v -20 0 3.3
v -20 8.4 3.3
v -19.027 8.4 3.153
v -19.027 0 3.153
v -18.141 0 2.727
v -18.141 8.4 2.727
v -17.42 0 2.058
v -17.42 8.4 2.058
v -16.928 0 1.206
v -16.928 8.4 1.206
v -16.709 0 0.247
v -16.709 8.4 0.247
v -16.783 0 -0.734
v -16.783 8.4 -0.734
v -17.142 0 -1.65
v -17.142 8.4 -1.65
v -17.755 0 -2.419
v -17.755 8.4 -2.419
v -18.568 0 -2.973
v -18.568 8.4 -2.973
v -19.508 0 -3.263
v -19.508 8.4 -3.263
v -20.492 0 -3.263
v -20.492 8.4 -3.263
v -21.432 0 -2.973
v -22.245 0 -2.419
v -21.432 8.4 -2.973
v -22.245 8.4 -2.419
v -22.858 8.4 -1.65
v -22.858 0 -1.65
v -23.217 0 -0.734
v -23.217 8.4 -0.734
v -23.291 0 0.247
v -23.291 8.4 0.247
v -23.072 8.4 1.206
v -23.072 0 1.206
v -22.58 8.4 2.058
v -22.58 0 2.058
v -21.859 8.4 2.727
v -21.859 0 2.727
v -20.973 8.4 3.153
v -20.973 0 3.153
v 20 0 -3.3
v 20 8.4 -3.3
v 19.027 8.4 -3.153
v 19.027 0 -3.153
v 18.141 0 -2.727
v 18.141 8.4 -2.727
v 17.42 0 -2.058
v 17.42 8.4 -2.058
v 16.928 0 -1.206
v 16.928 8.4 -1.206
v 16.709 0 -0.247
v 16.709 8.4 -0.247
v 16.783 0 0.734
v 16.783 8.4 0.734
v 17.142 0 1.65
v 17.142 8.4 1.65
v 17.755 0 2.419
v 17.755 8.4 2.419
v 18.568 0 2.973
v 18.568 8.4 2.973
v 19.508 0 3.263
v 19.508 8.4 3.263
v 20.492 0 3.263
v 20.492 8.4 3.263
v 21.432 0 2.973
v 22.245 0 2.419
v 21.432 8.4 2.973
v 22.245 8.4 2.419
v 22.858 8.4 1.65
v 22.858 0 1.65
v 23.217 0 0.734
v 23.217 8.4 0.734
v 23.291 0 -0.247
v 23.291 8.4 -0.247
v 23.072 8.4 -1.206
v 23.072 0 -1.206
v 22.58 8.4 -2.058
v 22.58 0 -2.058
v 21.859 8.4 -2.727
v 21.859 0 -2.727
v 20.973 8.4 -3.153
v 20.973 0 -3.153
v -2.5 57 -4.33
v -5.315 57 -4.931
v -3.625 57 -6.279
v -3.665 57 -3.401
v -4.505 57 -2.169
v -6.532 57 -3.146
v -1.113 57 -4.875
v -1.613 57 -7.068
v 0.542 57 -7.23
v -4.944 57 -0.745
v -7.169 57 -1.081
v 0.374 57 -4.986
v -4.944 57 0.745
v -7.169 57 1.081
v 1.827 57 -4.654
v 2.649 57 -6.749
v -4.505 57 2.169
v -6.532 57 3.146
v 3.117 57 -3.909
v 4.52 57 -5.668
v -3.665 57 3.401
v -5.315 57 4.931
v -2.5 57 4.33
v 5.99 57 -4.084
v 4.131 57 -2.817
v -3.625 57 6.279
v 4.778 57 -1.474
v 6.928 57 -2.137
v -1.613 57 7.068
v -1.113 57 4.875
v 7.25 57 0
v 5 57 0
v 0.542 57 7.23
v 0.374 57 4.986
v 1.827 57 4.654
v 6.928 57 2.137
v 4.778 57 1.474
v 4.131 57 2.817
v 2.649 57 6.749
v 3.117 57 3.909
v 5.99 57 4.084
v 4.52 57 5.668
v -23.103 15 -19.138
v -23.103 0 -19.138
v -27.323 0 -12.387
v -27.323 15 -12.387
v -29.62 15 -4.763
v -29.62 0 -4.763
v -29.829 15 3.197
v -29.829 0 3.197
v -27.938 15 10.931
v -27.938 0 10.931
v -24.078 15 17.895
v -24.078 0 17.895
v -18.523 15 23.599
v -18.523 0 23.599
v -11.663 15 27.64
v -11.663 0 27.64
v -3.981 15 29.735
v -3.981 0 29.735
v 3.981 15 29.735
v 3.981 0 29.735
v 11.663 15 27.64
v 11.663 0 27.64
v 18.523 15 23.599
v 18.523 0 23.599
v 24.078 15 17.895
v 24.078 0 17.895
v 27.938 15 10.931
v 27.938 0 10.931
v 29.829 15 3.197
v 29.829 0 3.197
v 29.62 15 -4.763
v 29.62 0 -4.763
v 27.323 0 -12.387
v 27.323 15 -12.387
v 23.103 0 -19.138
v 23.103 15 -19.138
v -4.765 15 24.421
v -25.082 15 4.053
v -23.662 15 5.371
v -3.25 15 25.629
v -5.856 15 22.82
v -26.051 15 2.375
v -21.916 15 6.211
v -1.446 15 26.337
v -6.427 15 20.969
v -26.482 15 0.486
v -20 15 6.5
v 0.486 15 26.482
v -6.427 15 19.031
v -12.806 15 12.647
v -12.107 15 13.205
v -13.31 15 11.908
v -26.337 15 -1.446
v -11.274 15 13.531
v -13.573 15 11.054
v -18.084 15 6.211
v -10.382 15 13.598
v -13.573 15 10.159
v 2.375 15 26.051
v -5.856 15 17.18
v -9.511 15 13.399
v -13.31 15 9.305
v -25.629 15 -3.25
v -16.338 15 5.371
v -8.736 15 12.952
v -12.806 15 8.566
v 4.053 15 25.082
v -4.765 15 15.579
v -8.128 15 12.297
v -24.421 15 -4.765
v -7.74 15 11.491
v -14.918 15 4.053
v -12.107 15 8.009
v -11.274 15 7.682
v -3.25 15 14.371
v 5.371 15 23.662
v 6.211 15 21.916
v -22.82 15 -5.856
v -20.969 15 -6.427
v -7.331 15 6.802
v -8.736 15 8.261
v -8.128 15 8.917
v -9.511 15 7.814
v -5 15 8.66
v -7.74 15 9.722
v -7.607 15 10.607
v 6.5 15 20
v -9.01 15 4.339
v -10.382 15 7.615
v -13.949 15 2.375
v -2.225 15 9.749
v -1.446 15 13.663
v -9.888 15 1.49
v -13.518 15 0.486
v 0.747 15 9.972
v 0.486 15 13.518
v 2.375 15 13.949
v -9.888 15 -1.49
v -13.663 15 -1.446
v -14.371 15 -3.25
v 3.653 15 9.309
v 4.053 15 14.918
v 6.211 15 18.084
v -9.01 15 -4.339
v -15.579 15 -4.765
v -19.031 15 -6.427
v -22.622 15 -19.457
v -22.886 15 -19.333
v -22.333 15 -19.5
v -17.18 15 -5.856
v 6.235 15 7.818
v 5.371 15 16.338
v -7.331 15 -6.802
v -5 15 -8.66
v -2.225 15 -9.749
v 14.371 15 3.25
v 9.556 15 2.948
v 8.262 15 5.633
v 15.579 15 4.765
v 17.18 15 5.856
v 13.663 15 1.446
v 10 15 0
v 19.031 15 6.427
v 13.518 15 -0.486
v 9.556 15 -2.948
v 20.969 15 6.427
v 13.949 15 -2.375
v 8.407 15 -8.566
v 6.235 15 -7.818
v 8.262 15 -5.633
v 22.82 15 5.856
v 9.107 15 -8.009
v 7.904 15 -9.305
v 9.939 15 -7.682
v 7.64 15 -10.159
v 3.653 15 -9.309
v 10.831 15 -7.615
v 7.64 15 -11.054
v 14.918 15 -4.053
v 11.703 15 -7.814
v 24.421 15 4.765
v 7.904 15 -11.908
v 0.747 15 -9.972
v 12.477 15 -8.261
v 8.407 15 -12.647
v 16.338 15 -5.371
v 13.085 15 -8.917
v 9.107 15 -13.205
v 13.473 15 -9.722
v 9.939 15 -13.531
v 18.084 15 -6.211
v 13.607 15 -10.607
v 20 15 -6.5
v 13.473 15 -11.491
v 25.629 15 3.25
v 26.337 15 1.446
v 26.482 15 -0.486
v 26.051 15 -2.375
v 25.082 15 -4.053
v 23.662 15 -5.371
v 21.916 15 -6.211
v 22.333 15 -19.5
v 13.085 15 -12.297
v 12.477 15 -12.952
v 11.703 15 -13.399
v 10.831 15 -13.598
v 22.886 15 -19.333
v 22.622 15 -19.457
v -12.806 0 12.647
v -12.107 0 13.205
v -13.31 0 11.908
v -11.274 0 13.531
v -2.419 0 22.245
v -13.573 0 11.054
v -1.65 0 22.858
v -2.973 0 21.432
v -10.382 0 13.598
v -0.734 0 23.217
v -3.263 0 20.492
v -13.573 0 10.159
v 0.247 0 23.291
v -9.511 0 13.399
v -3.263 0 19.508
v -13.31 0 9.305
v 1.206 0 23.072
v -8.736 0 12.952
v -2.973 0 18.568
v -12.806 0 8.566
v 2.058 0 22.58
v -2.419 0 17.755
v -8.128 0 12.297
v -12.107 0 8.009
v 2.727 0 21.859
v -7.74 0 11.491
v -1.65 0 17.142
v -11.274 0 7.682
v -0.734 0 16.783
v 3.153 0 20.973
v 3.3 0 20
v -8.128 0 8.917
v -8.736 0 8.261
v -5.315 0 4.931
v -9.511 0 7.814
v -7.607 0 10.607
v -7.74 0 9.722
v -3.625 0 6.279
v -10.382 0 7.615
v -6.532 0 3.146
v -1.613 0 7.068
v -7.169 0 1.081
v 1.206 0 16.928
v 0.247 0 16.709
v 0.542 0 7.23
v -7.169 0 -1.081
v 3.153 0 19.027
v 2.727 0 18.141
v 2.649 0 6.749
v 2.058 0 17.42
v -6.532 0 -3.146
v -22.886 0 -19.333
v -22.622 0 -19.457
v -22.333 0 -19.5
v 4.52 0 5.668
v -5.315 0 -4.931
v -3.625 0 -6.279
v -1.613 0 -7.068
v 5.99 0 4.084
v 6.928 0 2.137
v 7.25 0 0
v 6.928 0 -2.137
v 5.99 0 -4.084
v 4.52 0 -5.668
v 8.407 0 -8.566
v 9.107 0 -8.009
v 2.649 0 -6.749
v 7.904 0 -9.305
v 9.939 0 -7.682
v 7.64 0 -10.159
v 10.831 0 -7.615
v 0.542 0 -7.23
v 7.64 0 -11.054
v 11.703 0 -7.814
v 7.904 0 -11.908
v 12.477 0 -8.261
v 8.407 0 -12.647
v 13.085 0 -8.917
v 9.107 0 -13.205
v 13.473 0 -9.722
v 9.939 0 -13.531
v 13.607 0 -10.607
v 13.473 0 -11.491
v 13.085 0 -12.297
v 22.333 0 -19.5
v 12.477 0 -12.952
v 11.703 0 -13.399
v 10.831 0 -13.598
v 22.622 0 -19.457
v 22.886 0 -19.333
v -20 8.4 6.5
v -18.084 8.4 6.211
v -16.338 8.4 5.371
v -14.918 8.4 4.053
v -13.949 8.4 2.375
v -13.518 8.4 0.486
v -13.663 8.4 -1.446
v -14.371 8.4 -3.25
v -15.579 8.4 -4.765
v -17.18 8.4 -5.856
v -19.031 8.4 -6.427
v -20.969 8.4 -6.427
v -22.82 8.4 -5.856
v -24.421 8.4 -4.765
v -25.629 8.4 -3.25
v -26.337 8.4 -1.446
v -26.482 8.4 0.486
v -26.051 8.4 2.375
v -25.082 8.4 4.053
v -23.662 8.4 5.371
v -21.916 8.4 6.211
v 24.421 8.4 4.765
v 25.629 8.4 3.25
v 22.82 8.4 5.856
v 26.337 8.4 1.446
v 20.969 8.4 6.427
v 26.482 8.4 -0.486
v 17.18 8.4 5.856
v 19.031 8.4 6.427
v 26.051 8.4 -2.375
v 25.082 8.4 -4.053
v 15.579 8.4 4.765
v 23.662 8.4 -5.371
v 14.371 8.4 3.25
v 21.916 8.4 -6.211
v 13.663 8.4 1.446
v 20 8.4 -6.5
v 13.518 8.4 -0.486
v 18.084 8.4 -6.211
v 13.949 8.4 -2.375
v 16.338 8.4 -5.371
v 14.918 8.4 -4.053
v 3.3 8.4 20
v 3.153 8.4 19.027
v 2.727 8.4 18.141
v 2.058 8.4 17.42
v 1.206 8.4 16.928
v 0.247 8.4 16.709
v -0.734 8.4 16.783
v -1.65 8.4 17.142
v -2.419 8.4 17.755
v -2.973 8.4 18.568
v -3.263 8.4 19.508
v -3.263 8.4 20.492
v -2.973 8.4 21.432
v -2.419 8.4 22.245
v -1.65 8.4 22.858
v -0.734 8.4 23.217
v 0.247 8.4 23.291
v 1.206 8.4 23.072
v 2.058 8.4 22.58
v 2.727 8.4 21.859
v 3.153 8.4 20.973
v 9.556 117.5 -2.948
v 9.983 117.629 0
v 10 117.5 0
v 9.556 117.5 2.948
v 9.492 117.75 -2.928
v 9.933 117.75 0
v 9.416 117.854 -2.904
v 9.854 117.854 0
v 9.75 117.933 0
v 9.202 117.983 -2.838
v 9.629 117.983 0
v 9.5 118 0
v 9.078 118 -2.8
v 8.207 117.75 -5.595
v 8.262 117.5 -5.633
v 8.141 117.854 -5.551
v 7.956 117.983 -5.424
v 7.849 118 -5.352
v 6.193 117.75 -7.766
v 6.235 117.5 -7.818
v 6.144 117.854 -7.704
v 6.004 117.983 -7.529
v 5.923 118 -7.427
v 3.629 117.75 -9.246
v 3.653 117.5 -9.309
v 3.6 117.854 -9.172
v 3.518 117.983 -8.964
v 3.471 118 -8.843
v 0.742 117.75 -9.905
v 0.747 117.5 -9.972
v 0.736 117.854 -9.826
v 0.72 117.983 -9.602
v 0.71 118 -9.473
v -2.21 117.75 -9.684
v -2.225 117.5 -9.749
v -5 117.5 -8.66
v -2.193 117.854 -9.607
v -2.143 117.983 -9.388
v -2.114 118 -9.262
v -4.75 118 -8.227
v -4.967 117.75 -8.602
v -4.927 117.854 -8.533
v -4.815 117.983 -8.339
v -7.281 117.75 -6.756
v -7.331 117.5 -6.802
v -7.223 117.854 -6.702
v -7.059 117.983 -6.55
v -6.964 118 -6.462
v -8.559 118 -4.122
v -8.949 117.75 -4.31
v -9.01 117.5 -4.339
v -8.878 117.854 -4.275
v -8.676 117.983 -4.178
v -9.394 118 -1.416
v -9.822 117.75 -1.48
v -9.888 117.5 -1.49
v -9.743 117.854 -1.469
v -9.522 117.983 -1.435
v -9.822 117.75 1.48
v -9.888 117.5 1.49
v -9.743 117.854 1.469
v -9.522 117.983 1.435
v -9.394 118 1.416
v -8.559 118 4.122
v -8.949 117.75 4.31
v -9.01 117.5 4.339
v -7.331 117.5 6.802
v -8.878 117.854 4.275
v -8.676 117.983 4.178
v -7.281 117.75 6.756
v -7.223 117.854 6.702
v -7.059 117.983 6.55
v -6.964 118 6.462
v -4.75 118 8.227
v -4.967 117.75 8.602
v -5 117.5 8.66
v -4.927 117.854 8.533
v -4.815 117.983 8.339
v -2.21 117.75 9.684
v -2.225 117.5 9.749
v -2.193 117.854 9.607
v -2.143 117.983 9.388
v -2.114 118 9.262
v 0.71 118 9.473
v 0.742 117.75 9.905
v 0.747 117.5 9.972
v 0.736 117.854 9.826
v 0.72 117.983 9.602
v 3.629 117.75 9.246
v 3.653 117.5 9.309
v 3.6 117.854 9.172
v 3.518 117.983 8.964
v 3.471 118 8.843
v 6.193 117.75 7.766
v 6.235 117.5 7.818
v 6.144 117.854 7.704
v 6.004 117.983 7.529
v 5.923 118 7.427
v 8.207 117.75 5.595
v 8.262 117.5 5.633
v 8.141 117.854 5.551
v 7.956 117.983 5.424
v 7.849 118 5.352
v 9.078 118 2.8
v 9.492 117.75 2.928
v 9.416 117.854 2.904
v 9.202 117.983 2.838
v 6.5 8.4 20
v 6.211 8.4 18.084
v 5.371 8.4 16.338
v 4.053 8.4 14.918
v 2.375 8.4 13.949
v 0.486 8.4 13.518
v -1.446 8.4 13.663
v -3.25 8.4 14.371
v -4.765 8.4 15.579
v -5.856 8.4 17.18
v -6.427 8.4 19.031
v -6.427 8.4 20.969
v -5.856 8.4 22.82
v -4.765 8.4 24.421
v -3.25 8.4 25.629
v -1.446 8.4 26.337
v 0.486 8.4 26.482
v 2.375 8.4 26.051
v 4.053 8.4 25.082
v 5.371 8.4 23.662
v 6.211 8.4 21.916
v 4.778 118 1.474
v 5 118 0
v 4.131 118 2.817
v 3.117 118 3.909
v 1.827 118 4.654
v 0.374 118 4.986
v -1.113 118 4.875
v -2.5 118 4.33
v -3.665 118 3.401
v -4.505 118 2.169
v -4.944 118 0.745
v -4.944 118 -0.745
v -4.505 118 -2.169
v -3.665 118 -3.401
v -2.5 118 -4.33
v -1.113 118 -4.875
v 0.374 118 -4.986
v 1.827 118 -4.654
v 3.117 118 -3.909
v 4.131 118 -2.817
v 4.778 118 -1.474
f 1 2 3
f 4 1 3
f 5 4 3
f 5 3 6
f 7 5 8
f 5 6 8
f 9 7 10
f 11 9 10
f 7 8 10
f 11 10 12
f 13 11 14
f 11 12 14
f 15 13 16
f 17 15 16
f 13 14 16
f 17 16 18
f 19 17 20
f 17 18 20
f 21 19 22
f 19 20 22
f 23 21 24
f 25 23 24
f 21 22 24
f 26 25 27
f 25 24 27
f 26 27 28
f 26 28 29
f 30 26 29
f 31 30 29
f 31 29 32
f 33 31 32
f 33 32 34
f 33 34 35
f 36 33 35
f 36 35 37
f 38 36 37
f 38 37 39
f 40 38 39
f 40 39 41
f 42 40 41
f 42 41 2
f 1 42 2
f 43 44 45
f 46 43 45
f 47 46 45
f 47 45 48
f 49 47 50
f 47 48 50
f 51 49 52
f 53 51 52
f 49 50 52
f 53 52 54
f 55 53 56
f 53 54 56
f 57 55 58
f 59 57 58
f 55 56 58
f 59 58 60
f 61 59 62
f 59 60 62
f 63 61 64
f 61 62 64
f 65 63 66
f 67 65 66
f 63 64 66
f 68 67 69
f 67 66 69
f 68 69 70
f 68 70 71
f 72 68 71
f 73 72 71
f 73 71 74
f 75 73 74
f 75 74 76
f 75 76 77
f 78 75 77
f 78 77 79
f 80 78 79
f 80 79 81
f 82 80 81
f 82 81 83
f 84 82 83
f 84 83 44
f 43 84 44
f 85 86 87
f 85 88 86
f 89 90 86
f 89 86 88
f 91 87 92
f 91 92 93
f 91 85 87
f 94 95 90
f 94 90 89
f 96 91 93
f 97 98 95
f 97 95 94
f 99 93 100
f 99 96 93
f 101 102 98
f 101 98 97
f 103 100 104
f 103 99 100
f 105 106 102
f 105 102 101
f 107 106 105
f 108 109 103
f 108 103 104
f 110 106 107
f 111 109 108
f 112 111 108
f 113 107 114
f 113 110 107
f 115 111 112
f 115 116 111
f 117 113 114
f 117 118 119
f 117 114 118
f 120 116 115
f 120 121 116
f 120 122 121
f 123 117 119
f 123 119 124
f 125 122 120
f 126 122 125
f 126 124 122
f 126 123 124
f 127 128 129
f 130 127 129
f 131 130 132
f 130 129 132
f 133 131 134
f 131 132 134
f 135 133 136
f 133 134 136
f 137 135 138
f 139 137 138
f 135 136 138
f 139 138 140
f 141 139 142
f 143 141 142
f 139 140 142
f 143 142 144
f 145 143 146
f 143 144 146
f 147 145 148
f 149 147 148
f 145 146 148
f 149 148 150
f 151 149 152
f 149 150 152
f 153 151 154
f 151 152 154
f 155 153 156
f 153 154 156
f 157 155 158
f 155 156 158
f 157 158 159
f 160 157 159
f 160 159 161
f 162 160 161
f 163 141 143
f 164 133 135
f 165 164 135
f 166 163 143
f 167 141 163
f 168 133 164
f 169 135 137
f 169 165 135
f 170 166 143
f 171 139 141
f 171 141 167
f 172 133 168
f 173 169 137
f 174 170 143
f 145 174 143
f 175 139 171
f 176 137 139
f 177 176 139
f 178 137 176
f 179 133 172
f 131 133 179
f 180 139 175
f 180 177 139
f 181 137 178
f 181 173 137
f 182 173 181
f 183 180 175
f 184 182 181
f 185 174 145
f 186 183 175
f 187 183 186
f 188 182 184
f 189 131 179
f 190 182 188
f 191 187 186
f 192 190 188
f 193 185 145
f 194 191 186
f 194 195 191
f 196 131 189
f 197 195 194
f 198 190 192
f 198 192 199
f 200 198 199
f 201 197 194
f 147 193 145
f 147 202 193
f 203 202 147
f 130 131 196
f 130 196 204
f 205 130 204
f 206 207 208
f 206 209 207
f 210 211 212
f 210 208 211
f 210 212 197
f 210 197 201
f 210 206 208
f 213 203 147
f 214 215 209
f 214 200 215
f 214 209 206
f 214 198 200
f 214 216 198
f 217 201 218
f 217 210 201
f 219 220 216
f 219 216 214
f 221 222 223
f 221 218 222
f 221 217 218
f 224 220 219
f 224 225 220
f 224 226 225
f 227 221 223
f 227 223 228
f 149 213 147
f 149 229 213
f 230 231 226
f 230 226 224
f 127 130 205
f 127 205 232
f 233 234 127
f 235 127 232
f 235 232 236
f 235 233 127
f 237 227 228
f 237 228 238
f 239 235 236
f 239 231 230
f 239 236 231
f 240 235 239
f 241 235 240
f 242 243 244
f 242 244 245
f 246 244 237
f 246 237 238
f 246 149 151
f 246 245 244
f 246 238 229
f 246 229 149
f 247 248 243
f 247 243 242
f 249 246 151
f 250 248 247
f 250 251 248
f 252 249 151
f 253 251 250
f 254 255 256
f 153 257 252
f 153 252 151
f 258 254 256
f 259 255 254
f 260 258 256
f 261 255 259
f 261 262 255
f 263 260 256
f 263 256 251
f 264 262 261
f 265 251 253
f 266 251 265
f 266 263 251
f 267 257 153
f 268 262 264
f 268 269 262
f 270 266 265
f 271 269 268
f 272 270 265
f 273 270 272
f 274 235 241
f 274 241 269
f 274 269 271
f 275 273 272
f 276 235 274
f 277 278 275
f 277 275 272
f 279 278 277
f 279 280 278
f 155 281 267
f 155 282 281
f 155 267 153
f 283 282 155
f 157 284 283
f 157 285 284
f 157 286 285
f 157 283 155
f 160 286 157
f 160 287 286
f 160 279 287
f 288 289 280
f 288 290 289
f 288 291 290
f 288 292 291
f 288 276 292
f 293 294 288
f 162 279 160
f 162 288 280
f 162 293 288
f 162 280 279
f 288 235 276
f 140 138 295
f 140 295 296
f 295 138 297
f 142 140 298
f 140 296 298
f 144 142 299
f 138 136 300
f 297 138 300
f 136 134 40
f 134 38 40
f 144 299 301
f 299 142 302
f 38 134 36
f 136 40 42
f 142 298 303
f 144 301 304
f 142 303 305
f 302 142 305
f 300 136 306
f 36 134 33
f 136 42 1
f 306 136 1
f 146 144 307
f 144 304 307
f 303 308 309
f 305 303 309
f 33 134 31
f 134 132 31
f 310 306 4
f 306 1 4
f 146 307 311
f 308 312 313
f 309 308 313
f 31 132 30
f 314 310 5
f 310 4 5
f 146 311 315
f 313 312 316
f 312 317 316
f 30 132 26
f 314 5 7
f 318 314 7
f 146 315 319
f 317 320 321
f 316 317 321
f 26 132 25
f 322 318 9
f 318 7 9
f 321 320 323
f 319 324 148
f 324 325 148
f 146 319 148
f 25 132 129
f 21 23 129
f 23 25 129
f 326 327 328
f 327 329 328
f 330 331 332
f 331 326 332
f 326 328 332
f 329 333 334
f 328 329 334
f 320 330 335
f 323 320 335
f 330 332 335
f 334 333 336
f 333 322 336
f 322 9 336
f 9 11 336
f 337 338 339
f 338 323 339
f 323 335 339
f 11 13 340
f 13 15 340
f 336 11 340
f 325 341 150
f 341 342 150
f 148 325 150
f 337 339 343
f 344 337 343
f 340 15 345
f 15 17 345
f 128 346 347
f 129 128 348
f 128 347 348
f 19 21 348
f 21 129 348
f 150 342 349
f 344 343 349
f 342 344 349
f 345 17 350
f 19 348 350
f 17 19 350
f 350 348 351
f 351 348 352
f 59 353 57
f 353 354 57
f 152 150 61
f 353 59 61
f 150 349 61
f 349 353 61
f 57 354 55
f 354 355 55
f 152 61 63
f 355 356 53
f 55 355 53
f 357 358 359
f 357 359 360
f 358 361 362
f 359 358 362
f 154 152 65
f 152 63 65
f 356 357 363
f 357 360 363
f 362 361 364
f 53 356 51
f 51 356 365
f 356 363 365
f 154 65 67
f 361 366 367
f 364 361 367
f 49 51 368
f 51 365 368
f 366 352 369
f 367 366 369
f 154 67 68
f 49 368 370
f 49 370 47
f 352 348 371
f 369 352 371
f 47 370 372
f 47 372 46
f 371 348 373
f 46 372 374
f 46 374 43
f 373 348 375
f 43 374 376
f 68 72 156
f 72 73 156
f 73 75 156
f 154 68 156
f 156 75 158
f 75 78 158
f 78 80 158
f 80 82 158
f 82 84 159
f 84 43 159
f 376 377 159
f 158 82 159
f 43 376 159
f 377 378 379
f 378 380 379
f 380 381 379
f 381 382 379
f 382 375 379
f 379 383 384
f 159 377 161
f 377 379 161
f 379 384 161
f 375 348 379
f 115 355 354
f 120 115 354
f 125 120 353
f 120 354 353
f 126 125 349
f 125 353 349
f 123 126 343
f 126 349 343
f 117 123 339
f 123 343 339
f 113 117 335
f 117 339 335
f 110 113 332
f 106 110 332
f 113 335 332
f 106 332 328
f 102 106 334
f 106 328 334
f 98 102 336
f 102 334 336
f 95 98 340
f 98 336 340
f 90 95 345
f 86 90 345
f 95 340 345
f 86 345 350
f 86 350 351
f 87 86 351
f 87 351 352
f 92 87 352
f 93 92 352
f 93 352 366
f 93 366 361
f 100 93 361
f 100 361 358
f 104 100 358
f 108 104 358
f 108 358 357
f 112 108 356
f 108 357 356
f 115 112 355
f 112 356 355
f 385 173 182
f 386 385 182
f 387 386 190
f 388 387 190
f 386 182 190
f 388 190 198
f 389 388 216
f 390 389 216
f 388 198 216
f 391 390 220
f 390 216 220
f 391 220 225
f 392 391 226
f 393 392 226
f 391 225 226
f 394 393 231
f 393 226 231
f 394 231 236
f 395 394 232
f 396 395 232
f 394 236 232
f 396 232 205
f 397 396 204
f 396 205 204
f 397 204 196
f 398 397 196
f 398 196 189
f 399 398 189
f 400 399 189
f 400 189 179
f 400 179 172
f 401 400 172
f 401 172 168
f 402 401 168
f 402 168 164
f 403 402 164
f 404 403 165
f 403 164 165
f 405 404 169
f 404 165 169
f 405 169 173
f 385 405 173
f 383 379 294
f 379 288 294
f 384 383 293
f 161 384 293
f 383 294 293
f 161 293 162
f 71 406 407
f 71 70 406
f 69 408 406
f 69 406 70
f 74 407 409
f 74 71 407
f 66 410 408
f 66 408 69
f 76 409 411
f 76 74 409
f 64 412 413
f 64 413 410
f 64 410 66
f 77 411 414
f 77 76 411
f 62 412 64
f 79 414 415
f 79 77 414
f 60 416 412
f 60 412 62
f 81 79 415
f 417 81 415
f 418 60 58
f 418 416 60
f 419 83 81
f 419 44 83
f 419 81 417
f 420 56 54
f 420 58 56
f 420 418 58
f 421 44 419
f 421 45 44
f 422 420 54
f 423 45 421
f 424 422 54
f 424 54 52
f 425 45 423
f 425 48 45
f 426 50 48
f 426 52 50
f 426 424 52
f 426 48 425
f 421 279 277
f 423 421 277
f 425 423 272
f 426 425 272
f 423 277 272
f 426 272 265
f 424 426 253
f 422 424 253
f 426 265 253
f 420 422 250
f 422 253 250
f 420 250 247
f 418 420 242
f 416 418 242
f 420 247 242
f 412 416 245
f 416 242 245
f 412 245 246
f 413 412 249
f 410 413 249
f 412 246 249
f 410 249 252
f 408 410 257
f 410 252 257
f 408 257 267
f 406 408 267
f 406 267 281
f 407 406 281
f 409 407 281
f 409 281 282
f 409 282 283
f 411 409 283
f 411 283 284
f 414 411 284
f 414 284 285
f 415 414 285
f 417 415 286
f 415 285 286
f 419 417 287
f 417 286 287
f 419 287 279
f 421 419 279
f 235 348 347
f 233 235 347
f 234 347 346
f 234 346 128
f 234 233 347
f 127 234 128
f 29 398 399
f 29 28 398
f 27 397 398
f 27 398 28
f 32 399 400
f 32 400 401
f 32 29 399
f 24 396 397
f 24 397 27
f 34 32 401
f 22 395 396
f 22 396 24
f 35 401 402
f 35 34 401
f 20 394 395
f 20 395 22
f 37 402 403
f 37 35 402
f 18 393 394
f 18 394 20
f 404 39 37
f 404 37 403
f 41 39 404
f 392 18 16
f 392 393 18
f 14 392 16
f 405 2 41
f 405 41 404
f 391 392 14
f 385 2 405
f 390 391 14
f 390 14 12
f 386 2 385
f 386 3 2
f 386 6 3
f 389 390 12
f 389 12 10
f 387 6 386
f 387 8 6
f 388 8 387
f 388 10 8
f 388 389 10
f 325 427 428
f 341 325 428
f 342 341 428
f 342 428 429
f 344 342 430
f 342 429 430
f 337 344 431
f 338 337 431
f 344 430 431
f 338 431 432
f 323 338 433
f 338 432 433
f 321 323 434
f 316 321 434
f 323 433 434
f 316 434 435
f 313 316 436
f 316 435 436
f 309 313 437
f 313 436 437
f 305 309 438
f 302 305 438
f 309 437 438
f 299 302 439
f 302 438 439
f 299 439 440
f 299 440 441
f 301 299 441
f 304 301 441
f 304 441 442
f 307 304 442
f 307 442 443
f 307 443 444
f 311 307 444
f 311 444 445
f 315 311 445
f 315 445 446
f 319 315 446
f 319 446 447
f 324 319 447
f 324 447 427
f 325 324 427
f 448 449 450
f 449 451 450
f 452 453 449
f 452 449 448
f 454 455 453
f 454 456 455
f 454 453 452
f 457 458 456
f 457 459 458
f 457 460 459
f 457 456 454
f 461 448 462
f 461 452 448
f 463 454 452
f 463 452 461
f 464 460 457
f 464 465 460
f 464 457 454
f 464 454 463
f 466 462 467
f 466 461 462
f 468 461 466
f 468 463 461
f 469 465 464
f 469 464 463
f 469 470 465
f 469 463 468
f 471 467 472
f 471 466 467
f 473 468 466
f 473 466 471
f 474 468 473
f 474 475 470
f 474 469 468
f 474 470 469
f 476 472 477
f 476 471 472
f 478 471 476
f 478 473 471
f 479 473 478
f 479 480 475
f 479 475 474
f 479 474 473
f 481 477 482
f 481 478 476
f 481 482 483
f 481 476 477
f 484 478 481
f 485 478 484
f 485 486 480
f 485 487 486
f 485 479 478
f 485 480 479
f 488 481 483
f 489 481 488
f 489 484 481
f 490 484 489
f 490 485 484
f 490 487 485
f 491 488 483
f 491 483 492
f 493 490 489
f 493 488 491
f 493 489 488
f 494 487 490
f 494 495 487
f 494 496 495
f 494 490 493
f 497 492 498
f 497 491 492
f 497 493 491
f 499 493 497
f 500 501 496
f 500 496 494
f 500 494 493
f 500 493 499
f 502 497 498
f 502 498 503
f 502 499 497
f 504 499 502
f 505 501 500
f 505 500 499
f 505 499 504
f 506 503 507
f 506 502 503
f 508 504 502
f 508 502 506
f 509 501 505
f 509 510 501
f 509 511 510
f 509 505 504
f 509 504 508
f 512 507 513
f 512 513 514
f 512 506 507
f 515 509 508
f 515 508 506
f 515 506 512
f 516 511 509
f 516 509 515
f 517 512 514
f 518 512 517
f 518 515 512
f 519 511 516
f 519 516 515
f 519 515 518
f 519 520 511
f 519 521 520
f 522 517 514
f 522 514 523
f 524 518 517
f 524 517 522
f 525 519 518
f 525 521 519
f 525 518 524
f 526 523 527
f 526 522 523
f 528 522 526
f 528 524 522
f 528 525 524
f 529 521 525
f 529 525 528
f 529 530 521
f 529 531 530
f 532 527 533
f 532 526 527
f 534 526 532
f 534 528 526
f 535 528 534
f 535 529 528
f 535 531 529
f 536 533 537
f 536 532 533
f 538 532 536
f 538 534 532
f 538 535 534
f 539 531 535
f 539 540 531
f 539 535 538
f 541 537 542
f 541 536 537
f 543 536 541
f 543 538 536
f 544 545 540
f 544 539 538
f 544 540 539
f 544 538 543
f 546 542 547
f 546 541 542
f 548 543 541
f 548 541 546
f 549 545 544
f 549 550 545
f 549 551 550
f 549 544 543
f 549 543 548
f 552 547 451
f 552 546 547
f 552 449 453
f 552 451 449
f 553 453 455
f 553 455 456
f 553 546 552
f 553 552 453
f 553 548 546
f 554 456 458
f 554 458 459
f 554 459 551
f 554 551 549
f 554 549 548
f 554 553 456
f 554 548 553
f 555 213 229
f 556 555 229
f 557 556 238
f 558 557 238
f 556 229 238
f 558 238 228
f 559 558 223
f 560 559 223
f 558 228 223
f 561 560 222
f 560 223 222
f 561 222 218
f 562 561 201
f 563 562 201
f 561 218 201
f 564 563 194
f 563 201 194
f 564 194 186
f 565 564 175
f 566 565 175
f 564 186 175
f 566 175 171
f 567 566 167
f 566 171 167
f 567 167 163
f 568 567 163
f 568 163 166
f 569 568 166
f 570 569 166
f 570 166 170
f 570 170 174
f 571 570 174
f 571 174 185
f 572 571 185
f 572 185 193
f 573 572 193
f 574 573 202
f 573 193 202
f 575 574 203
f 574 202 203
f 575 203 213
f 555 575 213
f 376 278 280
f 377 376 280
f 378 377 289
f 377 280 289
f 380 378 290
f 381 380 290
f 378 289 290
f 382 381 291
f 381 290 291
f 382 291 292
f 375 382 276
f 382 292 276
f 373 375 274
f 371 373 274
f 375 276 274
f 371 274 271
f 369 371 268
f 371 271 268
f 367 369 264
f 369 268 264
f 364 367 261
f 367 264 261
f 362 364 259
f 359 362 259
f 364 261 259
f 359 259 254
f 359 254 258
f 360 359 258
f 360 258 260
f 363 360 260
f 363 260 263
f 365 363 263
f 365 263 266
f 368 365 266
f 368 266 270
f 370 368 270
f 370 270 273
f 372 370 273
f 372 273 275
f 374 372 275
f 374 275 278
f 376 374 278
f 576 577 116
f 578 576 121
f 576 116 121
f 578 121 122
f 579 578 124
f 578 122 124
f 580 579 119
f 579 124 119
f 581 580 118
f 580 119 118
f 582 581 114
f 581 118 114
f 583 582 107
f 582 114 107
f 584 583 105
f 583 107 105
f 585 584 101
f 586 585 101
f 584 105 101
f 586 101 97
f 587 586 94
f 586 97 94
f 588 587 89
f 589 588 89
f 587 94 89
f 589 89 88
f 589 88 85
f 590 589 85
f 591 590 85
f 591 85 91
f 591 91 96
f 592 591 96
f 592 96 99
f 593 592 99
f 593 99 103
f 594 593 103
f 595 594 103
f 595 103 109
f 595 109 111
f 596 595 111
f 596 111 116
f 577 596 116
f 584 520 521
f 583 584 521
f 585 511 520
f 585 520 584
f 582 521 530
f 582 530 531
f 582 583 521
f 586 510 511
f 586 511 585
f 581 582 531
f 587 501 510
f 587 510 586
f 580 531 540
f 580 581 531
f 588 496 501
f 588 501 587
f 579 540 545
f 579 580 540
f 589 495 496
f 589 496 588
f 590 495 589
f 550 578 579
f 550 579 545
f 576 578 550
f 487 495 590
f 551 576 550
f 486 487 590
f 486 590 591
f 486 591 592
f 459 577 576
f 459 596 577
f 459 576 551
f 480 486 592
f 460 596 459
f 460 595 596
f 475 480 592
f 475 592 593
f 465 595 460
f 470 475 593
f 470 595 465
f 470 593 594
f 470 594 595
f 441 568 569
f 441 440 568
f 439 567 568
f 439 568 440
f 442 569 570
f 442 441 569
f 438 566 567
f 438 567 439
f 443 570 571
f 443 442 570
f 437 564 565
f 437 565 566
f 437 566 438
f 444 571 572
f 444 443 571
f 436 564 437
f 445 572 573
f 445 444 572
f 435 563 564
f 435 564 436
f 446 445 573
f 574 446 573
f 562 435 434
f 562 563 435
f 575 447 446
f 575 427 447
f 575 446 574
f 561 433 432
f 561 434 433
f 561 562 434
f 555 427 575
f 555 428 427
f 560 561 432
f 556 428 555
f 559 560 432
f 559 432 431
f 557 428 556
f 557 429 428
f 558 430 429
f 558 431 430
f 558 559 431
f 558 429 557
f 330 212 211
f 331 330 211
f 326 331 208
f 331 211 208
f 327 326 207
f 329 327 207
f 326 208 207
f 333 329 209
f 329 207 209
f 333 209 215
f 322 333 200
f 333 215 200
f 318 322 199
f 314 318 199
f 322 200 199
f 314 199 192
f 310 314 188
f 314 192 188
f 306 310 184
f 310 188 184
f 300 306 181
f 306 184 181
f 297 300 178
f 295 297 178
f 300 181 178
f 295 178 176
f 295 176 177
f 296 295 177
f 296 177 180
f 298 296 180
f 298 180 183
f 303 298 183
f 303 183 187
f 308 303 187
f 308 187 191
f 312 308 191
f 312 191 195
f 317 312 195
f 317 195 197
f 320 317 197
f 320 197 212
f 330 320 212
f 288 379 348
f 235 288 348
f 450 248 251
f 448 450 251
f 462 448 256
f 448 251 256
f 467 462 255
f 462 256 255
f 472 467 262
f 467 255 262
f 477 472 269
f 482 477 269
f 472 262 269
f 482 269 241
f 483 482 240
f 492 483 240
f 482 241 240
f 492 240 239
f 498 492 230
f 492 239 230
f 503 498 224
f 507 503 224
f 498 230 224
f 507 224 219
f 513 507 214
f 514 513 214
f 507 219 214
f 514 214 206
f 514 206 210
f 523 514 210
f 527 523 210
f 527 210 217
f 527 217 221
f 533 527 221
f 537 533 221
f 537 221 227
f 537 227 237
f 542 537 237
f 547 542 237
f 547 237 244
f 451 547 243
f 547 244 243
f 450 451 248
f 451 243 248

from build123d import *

# Parameters (mm, degrees)
BOSS_EXTRUDE1_DEPTH = 15
SKETCH2_R           = 10
BOSS_EXTRUDE2_DEPTH = 103
SKETCH4_R           = 7.25
CUT_EXTRUDE1_DEPTH  = 57
SKETCH5_R           = 5
CUT_EXTRUDE2_DEPTH  = 62
SKETCH7_R           = 6.5
CUT_EXTRUDE3_DEPTH  = 6.6
SKETCH8_R           = 3.3
CUT_EXTRUDE4_DEPTH  = 9.4
CIRPATTERN1_COUNT   = 4
FILLET1_R           = 0.5
FILLET2_R           = 1
SKETCH9_R           = 3
CUT_EXTRUDE5_DEPTH  = 16


with BuildPart() as part:
    # Sketch1 → Boss-Extrude1 (new body)
    with BuildSketch(Plane(origin=(0, 0, 0), x_dir=(1, 0, 0), z_dir=(0, 1, 0))):
        with BuildLine():
            Line((22.79802623, 19.5), (-22.79802623, 19.5))
            ThreePointArc((-22.79802623, 19.5), (0, -30), (22.79802623, 19.5))
        make_face()
    extrude(amount=BOSS_EXTRUDE1_DEPTH)

    # Sketch2 → Boss-Extrude2 (add)
    with BuildSketch(Plane(origin=(0, 15, 0), x_dir=(1, 0, 0), z_dir=(0, 1, 0))):
        Circle(SKETCH2_R)
    extrude(amount=BOSS_EXTRUDE2_DEPTH)

    # Sketch4 → Cut-Extrude1 (cut)
    with BuildSketch(Plane.XZ):
        Circle(SKETCH4_R)
    extrude(amount=-CUT_EXTRUDE1_DEPTH, mode=Mode.SUBTRACT)

    # Sketch5 → Cut-Extrude2 (cut, through all)
    with BuildSketch(Plane.XZ.offset(-57)):
        Circle(SKETCH5_R)
    extrude(amount=-CUT_EXTRUDE2_DEPTH, mode=Mode.SUBTRACT)

    # Sketch7 → Cut-Extrude3 (cut)
    with BuildSketch(Plane(origin=(0, 15, 0), x_dir=(1, 0, 0), z_dir=(0, 1, 0))):
        with Locations((0, -20)):
            Circle(SKETCH7_R)
    cut_extrude3 = extrude(amount=-CUT_EXTRUDE3_DEPTH, mode=Mode.SUBTRACT)

    # Sketch8 → Cut-Extrude4 (cut, through all)
    with BuildSketch(Plane(origin=(0, 8.4, 0), x_dir=(1, 0, 0), z_dir=(0, 1, 0))):
        with Locations((0, -20)):
            Circle(SKETCH8_R)
    cut_extrude4 = extrude(amount=-CUT_EXTRUDE4_DEPTH, mode=Mode.SUBTRACT)

    # CirPattern1: Cut-Extrude3, Cut-Extrude4 ×4 about axis, 1 skipped
    cirpattern1_axis = Axis((0, 0, 0), (0, -1, 0))
    add([cut_extrude3.rotate(cirpattern1_axis, i * 360 / CIRPATTERN1_COUNT) for i in range(1, CIRPATTERN1_COUNT) if i not in (2,)], mode=Mode.SUBTRACT)
    add([cut_extrude4.rotate(cirpattern1_axis, i * 360 / CIRPATTERN1_COUNT) for i in range(1, CIRPATTERN1_COUNT) if i not in (2,)], mode=Mode.SUBTRACT)

    # Fillet1
    fillet1_edges = [part.edges().sort_by_distance(p)[0] for p in [
        (-10, 118, 0),
    ]]
    fillet(fillet1_edges, radius=FILLET1_R)

    # Fillet2
    fillet2_edges = [part.edges().sort_by_distance(p)[0] for p in [
        (-22.79802623, 7.5, -19.5),
        (22.79802623, 7.5, -19.5),
    ]]
    fillet(fillet2_edges, radius=FILLET2_R)

    # Sketch9 → Cut-Extrude5 (cut, through all)
    with BuildSketch(Plane(origin=(0, 15, 0), x_dir=(1, 0, 0), z_dir=(0, 1, 0))):
        with Locations((-10.606601718, -10.606601718)):
            Circle(SKETCH9_R)
        with Locations((10.606601718, 10.606601718)):
            Circle(SKETCH9_R)
    extrude(amount=-CUT_EXTRUDE5_DEPTH, mode=Mode.SUBTRACT)


solid = part.part
